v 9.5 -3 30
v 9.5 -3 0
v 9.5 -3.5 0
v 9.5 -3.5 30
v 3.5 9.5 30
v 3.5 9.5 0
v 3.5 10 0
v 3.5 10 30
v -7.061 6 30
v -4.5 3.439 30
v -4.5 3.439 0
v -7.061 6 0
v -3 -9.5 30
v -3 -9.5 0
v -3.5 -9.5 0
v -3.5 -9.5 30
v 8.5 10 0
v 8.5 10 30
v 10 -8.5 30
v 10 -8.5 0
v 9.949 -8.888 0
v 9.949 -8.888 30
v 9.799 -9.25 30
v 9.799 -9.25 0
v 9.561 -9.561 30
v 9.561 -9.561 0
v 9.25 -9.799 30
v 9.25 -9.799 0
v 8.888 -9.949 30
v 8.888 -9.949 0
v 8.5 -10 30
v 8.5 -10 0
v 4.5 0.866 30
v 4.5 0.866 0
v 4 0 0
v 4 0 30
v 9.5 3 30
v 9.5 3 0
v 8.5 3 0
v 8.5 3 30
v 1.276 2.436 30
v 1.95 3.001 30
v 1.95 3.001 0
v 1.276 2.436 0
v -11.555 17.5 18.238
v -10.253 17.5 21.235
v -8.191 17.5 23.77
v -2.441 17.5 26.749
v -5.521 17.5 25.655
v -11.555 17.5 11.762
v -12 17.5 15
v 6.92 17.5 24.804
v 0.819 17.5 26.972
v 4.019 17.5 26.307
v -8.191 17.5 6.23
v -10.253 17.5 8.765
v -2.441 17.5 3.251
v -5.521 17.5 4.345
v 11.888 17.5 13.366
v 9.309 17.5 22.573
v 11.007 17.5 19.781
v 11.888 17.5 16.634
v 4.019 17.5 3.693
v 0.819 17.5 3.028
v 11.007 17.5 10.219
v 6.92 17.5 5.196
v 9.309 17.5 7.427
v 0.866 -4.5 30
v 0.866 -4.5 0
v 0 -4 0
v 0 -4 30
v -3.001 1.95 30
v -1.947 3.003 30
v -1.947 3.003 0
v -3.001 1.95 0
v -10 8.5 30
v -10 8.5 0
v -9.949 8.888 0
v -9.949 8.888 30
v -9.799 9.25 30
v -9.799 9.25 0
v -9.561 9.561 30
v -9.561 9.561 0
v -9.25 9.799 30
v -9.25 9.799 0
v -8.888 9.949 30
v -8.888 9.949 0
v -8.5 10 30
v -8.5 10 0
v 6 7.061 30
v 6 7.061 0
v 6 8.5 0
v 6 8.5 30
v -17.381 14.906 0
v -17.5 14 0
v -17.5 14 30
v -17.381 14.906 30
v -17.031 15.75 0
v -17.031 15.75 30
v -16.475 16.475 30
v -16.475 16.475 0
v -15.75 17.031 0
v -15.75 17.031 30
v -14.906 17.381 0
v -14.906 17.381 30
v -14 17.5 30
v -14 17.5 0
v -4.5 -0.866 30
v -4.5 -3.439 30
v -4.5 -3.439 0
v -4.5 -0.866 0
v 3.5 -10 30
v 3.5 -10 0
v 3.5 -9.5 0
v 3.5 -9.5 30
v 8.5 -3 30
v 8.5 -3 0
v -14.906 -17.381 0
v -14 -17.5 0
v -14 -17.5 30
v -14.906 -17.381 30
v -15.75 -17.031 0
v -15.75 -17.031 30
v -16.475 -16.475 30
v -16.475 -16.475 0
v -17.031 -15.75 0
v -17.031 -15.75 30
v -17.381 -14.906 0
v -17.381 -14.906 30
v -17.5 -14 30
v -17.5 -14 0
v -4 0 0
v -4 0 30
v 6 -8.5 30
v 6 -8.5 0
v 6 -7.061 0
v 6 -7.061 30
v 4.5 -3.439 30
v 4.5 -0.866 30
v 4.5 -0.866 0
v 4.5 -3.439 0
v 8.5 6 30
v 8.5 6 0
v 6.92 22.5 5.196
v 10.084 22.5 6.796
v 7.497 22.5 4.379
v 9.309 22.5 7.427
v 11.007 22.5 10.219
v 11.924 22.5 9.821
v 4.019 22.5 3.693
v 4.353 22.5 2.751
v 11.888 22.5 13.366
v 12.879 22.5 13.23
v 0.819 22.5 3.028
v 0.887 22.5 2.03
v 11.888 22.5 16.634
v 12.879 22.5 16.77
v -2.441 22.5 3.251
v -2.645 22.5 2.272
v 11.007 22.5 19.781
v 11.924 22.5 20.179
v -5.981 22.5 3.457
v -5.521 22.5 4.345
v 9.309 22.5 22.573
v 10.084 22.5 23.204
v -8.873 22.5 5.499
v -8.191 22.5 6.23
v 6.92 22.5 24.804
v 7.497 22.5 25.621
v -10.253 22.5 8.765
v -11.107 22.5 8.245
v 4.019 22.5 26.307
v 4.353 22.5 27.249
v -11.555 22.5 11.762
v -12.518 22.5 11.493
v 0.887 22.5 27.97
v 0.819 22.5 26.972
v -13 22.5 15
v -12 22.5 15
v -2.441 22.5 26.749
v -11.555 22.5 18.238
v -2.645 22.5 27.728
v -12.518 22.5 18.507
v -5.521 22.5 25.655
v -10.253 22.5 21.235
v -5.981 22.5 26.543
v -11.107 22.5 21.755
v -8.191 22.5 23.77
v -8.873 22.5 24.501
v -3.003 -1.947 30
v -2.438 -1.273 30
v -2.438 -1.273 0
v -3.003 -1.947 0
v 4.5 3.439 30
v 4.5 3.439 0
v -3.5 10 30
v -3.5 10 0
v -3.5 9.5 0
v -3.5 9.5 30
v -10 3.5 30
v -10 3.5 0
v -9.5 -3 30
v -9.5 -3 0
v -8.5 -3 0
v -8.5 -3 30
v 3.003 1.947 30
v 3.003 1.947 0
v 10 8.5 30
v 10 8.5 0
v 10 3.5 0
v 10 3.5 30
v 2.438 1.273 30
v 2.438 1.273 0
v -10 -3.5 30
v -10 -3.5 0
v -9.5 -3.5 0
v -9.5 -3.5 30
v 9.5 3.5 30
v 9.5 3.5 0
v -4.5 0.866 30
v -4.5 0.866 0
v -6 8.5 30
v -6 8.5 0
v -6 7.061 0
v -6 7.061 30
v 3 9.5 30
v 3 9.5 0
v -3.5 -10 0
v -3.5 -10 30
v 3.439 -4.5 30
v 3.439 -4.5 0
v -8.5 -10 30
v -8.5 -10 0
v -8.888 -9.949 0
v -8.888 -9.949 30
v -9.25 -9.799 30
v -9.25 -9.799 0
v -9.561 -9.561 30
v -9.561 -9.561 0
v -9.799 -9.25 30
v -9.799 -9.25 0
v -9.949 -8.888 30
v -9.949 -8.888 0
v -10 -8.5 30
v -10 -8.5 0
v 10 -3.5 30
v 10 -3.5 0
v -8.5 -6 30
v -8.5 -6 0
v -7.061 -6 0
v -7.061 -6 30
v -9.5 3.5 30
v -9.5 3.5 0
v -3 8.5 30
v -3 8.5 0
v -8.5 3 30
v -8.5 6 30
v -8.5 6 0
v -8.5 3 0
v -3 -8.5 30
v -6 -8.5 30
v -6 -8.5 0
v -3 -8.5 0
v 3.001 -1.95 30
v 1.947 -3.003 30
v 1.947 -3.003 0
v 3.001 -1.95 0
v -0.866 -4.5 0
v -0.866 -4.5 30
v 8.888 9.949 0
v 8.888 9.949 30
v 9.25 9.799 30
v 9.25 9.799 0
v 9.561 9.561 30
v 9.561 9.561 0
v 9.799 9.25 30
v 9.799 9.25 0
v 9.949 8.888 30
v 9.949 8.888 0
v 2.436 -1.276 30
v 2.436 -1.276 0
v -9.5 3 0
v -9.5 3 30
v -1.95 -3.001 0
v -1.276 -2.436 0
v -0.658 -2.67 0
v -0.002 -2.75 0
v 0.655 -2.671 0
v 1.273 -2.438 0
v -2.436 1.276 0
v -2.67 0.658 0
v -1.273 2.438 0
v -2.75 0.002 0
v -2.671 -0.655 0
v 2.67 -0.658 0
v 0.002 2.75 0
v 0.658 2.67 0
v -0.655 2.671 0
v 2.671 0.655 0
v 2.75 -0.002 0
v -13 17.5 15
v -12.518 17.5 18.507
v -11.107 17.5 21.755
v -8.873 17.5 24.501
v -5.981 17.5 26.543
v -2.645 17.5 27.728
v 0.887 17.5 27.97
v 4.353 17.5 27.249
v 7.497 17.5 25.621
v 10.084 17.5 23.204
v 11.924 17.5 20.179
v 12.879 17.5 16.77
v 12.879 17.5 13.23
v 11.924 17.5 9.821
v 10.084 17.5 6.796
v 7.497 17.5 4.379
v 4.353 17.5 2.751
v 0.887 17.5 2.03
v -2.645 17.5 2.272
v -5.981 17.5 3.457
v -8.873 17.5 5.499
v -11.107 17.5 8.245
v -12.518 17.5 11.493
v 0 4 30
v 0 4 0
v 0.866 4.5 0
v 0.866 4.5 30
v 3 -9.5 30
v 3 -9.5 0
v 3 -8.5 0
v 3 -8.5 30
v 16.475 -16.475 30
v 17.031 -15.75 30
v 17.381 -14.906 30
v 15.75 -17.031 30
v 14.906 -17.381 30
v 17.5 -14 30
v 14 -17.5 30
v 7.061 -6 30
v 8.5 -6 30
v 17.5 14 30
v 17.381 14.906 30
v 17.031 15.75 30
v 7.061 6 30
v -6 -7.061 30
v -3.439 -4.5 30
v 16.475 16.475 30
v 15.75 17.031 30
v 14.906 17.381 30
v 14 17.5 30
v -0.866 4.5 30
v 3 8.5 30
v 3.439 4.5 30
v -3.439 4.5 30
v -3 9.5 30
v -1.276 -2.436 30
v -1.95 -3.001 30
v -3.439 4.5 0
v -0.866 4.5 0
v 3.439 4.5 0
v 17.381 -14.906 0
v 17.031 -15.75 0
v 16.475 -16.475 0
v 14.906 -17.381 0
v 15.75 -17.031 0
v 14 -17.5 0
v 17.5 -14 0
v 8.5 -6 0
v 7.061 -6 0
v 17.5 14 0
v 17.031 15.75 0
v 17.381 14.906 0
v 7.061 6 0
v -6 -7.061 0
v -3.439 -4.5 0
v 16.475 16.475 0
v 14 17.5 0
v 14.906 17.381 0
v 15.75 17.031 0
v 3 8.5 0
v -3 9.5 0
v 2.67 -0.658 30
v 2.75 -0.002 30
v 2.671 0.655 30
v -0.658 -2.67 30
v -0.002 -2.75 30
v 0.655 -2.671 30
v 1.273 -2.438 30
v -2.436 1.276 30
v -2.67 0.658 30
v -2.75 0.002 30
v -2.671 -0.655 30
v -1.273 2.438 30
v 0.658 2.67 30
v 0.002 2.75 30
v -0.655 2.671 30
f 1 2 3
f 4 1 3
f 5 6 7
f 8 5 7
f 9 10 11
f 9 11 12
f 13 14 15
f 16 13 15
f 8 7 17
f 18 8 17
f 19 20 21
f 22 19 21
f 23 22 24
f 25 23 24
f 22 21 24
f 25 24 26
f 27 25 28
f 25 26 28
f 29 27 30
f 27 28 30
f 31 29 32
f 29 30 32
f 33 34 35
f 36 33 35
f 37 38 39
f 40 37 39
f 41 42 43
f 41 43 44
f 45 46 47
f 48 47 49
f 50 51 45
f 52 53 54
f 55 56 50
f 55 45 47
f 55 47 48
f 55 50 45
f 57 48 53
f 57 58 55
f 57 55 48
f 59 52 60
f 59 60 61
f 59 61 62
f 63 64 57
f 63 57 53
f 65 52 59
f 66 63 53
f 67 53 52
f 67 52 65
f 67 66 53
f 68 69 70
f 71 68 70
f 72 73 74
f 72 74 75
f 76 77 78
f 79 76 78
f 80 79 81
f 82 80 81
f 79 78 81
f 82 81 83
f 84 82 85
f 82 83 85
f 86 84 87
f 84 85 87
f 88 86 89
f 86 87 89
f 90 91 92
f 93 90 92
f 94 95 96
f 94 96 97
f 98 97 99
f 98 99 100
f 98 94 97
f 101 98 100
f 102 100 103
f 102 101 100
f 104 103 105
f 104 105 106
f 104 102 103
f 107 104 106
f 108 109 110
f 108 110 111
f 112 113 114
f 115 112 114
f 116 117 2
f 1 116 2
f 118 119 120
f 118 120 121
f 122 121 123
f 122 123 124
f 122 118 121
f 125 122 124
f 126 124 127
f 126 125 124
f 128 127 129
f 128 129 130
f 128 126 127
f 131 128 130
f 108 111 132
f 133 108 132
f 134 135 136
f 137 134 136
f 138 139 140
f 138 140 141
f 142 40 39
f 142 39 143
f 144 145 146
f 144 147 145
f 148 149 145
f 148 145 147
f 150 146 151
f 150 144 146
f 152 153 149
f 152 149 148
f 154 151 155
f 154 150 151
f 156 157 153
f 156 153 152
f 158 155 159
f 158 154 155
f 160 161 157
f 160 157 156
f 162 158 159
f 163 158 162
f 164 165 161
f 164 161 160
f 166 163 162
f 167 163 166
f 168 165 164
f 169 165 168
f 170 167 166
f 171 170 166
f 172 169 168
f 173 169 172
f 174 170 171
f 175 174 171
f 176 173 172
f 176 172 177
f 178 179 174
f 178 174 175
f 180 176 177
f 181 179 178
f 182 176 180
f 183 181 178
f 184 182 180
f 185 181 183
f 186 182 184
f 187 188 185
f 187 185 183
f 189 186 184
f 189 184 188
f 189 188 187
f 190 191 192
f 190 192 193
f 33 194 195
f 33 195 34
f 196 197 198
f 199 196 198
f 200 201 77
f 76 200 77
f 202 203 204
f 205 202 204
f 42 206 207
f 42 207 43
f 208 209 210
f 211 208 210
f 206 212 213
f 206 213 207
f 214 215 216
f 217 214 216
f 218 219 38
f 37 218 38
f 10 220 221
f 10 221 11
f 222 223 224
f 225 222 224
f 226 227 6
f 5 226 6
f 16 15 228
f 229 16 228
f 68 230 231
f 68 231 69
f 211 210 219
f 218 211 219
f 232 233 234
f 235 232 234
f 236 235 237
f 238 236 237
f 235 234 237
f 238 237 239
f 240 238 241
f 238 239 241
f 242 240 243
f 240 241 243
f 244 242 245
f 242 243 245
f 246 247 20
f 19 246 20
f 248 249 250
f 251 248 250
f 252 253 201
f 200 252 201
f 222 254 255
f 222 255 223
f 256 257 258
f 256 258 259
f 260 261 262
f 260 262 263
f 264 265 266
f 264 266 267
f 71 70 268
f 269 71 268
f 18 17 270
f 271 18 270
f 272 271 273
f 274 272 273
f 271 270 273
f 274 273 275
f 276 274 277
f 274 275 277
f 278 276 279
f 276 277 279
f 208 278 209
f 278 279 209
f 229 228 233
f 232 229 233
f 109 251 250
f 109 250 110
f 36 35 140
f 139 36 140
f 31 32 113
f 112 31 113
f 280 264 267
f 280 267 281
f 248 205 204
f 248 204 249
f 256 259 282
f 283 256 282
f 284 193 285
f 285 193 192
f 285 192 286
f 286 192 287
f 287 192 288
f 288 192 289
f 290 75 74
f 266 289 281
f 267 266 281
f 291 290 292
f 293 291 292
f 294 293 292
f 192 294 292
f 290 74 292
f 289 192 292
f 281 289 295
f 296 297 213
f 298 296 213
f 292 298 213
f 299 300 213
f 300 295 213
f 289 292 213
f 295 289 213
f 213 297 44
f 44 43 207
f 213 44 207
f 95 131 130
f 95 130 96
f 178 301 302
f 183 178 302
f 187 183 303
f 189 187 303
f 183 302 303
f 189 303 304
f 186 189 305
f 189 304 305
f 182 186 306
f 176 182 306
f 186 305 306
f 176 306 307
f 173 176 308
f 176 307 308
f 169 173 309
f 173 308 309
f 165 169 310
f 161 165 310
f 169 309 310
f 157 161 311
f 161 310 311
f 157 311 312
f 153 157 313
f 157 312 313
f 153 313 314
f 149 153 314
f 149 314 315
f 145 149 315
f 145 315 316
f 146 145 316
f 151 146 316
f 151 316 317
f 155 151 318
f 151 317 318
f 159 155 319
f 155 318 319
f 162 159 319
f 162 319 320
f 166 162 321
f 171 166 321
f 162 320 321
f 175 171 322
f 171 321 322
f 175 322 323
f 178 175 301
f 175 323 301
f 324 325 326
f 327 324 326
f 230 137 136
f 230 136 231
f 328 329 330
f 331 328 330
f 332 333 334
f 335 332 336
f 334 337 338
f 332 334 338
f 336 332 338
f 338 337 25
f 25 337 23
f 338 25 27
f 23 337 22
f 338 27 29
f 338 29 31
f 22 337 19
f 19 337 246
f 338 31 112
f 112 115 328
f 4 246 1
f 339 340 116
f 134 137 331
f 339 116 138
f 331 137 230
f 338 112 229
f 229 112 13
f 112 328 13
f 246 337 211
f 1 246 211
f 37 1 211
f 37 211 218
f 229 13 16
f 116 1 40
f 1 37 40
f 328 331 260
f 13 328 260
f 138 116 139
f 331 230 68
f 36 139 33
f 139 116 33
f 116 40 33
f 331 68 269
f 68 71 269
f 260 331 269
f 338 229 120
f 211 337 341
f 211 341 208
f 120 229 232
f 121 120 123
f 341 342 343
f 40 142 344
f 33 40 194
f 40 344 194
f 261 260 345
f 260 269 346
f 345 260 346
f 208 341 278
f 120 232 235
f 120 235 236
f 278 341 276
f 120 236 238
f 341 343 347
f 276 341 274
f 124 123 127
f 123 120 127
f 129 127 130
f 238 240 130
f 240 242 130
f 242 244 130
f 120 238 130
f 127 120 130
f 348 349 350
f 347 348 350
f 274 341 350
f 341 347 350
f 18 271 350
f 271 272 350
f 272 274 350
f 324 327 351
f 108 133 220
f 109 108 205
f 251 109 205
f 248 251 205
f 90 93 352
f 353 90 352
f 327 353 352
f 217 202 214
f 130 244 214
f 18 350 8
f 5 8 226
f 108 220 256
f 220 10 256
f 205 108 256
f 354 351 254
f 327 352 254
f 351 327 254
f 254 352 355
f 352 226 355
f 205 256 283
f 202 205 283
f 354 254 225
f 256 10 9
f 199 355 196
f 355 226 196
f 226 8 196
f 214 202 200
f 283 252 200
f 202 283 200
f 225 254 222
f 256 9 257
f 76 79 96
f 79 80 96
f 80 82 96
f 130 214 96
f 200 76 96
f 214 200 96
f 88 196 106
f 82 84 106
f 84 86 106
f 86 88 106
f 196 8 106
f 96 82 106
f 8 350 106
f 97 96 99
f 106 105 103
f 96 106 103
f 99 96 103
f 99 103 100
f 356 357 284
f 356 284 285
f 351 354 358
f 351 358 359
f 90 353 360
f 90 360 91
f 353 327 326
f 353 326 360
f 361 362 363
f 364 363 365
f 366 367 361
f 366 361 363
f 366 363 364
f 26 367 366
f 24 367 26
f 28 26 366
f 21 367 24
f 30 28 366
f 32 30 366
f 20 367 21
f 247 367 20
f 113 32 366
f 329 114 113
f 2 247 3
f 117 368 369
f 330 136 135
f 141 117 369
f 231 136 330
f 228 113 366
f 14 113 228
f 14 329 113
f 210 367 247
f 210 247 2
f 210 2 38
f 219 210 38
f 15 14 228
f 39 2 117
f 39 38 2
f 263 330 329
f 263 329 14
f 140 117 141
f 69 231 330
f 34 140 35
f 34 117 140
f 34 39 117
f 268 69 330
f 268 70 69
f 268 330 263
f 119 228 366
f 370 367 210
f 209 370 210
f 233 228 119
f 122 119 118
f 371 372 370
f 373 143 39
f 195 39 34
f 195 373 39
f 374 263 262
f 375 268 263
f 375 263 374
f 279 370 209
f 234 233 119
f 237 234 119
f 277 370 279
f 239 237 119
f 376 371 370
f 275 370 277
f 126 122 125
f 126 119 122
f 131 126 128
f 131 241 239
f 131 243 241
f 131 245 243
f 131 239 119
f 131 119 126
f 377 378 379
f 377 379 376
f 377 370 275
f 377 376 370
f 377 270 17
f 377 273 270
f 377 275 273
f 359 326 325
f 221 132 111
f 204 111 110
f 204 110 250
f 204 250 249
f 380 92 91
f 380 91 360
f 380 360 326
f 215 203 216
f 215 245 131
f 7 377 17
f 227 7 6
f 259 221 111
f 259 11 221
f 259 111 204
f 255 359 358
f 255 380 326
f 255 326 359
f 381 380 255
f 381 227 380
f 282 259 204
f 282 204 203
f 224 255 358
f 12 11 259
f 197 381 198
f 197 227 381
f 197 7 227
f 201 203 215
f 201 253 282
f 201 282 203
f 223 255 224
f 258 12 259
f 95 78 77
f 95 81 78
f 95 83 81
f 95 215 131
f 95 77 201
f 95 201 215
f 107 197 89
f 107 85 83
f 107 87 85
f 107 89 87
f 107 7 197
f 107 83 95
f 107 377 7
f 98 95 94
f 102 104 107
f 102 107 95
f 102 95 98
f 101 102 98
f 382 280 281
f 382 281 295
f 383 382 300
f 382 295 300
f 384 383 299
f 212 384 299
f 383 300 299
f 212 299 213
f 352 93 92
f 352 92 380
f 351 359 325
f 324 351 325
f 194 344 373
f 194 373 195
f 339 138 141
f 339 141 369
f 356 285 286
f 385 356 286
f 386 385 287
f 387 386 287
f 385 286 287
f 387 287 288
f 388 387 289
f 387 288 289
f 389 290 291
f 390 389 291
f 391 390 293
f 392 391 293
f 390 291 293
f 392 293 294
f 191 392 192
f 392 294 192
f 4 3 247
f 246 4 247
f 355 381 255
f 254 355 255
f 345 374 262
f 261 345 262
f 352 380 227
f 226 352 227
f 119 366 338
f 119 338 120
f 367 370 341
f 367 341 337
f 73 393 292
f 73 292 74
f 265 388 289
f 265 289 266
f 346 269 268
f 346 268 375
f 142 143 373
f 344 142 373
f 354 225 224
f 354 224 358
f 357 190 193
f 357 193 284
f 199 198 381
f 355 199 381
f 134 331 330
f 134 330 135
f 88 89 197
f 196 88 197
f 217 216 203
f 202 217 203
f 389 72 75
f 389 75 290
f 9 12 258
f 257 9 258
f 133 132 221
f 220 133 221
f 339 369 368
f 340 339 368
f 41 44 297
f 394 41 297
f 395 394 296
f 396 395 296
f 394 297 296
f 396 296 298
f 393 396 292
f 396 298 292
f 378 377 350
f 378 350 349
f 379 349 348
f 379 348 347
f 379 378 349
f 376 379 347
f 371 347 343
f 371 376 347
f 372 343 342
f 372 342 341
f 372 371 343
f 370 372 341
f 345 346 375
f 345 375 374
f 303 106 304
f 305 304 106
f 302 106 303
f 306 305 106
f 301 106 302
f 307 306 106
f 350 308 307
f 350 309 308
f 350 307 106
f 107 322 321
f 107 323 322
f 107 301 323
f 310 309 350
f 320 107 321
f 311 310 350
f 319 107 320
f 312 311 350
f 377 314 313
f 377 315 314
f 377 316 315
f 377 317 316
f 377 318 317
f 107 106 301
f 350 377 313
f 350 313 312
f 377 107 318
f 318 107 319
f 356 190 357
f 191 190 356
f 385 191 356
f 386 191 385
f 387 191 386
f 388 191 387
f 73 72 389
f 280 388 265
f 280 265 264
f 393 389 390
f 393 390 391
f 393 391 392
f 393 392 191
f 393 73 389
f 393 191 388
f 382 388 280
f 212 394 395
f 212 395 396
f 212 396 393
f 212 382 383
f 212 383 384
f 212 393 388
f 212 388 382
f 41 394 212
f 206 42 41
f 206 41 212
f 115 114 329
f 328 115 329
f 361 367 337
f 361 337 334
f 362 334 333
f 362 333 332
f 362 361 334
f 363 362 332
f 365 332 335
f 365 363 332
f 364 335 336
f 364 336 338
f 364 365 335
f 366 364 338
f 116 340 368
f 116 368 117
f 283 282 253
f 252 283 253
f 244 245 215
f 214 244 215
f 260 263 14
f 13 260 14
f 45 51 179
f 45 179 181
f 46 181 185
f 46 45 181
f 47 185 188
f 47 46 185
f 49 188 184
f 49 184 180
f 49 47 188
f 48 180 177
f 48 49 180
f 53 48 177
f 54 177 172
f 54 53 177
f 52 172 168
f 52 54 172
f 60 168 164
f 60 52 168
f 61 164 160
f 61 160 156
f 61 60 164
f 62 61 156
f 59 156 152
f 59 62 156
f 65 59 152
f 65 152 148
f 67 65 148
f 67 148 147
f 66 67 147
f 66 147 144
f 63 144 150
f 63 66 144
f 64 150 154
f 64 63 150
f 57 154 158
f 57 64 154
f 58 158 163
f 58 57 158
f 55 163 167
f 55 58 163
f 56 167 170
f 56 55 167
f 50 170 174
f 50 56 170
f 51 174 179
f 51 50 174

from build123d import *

# Parameters (mm, degrees)
ESQUISSE1_R          = 2.75
BOSS_EXTRU_1_DEPTH   = 30
BOSS_EXTRU_1_2_DEPTH = 30
ESQUISSE3_R          = 13
ESQUISSE3_R_2        = 12
BOSS_EXTRU_2_DEPTH   = 5
BOSS_EXTRU_3_START   = -30
BOSS_EXTRU_3_DEPTH   = 30


with BuildPart() as part:
    # Esquisse1 → Boss.-Extru.1 (new body)
    with BuildSketch(Plane.XY):
        Circle(ESQUISSE1_R)
    extrude(amount=BOSS_EXTRU_1_DEPTH)

    # Esquisse4 → Boss.-Extru.3 (add)
    with BuildSketch(Plane.XY.offset(30).offset(BOSS_EXTRU_3_START)):
        with BuildLine():
            Line((1.949592103, 3.000876196), (1.276279893, 2.435900169))
            ThreePointArc((1.276279893, 2.435900169), (0.001756003, 2.749999439), (-1.273167982, 2.43752811))
            Line((-1.273167982, 2.43752811), (-1.947287092, 3.003181207))
            Line((-1.947287092, 3.003181207), (-3.000876196, 1.949592103))
            Line((-3.000876196, 1.949592103), (-2.435900169, 1.276279893))
            ThreePointArc((-2.435900169, 1.276279893), (-2.749999439, 0.001756003), (-2.43752811, -1.273167982))
            Line((-2.43752811, -1.273167982), (-3.003181207, -1.947287092))
            Line((-3.003181207, -1.947287092), (-1.949592103, -3.000876196))
            Line((-1.949592103, -3.000876196), (-1.276279893, -2.435900169))
            ThreePointArc((-1.276279893, -2.435900169), (-0.001756003, -2.749999439), (1.273167982, -2.43752811))
            Line((1.273167982, -2.43752811), (1.947287092, -3.003181207))
            Line((1.947287092, -3.003181207), (3.000876196, -1.949592103))
            Line((3.000876196, -1.949592103), (2.435900169, -1.276279893))
            ThreePointArc((2.435900169, -1.276279893), (2.749999439, -0.001756003), (2.43752811, 1.273167982))
            Line((2.43752811, 1.273167982), (3.003181207, 1.947287092))
            Line((3.003181207, 1.947287092), (1.949592103, 3.000876196))
        make_face()
    extrude(amount=BOSS_EXTRU_3_DEPTH)


with BuildPart() as body_2:
    # Esquisse1 → Boss.-Extru.1 2 (new body)
    with BuildSketch(Plane.XY):
        with BuildLine():
            Line((-14, 17.5), (14, 17.5))
            ThreePointArc((14, 17.5), (16.474873734, 16.474873734), (17.5, 14))
            Line((17.5, 14), (17.5, -14))
            ThreePointArc((17.5, -14), (16.474873734, -16.474873734), (14, -17.5))
            Line((14, -17.5), (-14, -17.5))
            ThreePointArc((-14, -17.5), (-16.474873734, -16.474873734), (-17.5, -14))
            Line((-17.5, -14), (-17.5, 14))
            ThreePointArc((-17.5, 14), (-16.474873734, 16.474873734), (-14, 17.5))
        make_face()
        with BuildLine():
            Line((-4, 0), (-4.5, 0.866025404))
            Line((-4.5, 0.866025404), (-4.5, 3.439339828))
            Line((-4.5, 3.439339828), (-7.060660172, 6))
            Line((-7.060660172, 6), (-8.5, 6))
            Line((-8.5, 6), (-8.5, 3))
            Line((-8.5, 3), (-9.5, 3))
            Line((-9.5, 3), (-9.5, 3.5))
            Line((-9.5, 3.5), (-10, 3.5))
            Line((-10, 3.5), (-10, 8.5))
            ThreePointArc((-10, 8.5), (-9.560660172, 9.560660172), (-8.5, 10))
            Line((-8.5, 10), (-3.5, 10))
            Line((-3.5, 10), (-3.5, 9.5))
            Line((-3.5, 9.5), (-3, 9.5))
            Line((-3, 9.5), (-3, 8.5))
            Line((-3, 8.5), (-6, 8.5))
            Line((-6, 8.5), (-6, 7.060660172))
            Line((-6, 7.060660172), (-3.439339828, 4.5))
            Line((-3.439339828, 4.5), (-0.866025404, 4.5))
            Line((-0.866025404, 4.5), (0, 4))
            Line((0, 4), (0.866025404, 4.5))
            Line((0.866025404, 4.5), (3.439339828, 4.5))
            Line((3.439339828, 4.5), (6, 7.060660172))
            Line((6, 7.060660172), (6, 8.5))
            Line((6, 8.5), (3, 8.5))
            Line((3, 8.5), (3, 9.5))
            Line((3, 9.5), (3.5, 9.5))
            Line((3.5, 9.5), (3.5, 10))
            Line((3.5, 10), (8.5, 10))
            ThreePointArc((8.5, 10), (9.560660172, 9.560660172), (10, 8.5))
            Line((10, 8.5), (10, 3.5))
            Line((10, 3.5), (9.5, 3.5))
            Line((9.5, 3.5), (9.5, 3))
            Line((9.5, 3), (8.5, 3))
            Line((8.5, 3), (8.5, 6))
            Line((8.5, 6), (7.060660172, 6))
            Line((7.060660172, 6), (4.5, 3.439339828))
            Line((4.5, 3.439339828), (4.5, 0.866025404))
            Line((4.5, 0.866025404), (4, 0))
            Line((4, 0), (4.5, -0.866025404))
            Line((4.5, -0.866025404), (4.5, -3.439339828))
            Line((4.5, -3.439339828), (7.060660172, -6))
            Line((7.060660172, -6), (8.5, -6))
            Line((8.5, -6), (8.5, -3))
            Line((8.5, -3), (9.5, -3))
            Line((9.5, -3), (9.5, -3.5))
            Line((9.5, -3.5), (10, -3.5))
            Line((10, -3.5), (10, -8.5))
            ThreePointArc((10, -8.5), (9.560660172, -9.560660172), (8.5, -10))
            Line((8.5, -10), (3.5, -10))
            Line((3.5, -10), (3.5, -9.5))
            Line((3.5, -9.5), (3, -9.5))
            Line((3, -9.5), (3, -8.5))
            Line((3, -8.5), (6, -8.5))
            Line((6, -8.5), (6, -7.060660172))
            Line((6, -7.060660172), (3.439339828, -4.5))
            Line((3.439339828, -4.5), (0.866025404, -4.5))
            Line((0.866025404, -4.5), (0, -4))
            Line((0, -4), (-0.866025404, -4.5))
            Line((-0.866025404, -4.5), (-3.439339828, -4.5))
            Line((-3.439339828, -4.5), (-6, -7.060660172))
            Line((-6, -7.060660172), (-6, -8.5))
            Line((-6, -8.5), (-3, -8.5))
            Line((-3, -8.5), (-3, -9.5))
            Line((-3, -9.5), (-3.5, -9.5))
            Line((-3.5, -9.5), (-3.5, -10))
            Line((-3.5, -10), (-8.5, -10))
            ThreePointArc((-8.5, -10), (-9.560660172, -9.560660172), (-10, -8.5))
            Line((-10, -8.5), (-10, -3.5))
            Line((-10, -3.5), (-9.5, -3.5))
            Line((-9.5, -3.5), (-9.5, -3))
            Line((-9.5, -3), (-8.5, -3))
            Line((-8.5, -3), (-8.5, -6))
            Line((-8.5, -6), (-7.060660172, -6))
            Line((-7.060660172, -6), (-4.5, -3.439339828))
            Line((-4.5, -3.439339828), (-4.5, -0.866025404))
            Line((-4.5, -0.866025404), (-4, 0))
        make_face(mode=Mode.SUBTRACT)
    extrude(amount=BOSS_EXTRU_1_2_DEPTH)

    # Esquisse3 → Boss.-Extru.2 (add)
    with BuildSketch(Plane(origin=(0, 17.5, 0), x_dir=(1, 0, 0), z_dir=(0, 1, 0))):
        with Locations(Location((0, -15, 0), (0, 0, 180))):
            Circle(ESQUISSE3_R)
        with Locations(Location((0, -15, 0), (0, 0, 180))):
            Circle(ESQUISSE3_R_2, mode=Mode.SUBTRACT)
    extrude(amount=BOSS_EXTRU_2_DEPTH)


solid = Compound([part.part, body_2.part])
